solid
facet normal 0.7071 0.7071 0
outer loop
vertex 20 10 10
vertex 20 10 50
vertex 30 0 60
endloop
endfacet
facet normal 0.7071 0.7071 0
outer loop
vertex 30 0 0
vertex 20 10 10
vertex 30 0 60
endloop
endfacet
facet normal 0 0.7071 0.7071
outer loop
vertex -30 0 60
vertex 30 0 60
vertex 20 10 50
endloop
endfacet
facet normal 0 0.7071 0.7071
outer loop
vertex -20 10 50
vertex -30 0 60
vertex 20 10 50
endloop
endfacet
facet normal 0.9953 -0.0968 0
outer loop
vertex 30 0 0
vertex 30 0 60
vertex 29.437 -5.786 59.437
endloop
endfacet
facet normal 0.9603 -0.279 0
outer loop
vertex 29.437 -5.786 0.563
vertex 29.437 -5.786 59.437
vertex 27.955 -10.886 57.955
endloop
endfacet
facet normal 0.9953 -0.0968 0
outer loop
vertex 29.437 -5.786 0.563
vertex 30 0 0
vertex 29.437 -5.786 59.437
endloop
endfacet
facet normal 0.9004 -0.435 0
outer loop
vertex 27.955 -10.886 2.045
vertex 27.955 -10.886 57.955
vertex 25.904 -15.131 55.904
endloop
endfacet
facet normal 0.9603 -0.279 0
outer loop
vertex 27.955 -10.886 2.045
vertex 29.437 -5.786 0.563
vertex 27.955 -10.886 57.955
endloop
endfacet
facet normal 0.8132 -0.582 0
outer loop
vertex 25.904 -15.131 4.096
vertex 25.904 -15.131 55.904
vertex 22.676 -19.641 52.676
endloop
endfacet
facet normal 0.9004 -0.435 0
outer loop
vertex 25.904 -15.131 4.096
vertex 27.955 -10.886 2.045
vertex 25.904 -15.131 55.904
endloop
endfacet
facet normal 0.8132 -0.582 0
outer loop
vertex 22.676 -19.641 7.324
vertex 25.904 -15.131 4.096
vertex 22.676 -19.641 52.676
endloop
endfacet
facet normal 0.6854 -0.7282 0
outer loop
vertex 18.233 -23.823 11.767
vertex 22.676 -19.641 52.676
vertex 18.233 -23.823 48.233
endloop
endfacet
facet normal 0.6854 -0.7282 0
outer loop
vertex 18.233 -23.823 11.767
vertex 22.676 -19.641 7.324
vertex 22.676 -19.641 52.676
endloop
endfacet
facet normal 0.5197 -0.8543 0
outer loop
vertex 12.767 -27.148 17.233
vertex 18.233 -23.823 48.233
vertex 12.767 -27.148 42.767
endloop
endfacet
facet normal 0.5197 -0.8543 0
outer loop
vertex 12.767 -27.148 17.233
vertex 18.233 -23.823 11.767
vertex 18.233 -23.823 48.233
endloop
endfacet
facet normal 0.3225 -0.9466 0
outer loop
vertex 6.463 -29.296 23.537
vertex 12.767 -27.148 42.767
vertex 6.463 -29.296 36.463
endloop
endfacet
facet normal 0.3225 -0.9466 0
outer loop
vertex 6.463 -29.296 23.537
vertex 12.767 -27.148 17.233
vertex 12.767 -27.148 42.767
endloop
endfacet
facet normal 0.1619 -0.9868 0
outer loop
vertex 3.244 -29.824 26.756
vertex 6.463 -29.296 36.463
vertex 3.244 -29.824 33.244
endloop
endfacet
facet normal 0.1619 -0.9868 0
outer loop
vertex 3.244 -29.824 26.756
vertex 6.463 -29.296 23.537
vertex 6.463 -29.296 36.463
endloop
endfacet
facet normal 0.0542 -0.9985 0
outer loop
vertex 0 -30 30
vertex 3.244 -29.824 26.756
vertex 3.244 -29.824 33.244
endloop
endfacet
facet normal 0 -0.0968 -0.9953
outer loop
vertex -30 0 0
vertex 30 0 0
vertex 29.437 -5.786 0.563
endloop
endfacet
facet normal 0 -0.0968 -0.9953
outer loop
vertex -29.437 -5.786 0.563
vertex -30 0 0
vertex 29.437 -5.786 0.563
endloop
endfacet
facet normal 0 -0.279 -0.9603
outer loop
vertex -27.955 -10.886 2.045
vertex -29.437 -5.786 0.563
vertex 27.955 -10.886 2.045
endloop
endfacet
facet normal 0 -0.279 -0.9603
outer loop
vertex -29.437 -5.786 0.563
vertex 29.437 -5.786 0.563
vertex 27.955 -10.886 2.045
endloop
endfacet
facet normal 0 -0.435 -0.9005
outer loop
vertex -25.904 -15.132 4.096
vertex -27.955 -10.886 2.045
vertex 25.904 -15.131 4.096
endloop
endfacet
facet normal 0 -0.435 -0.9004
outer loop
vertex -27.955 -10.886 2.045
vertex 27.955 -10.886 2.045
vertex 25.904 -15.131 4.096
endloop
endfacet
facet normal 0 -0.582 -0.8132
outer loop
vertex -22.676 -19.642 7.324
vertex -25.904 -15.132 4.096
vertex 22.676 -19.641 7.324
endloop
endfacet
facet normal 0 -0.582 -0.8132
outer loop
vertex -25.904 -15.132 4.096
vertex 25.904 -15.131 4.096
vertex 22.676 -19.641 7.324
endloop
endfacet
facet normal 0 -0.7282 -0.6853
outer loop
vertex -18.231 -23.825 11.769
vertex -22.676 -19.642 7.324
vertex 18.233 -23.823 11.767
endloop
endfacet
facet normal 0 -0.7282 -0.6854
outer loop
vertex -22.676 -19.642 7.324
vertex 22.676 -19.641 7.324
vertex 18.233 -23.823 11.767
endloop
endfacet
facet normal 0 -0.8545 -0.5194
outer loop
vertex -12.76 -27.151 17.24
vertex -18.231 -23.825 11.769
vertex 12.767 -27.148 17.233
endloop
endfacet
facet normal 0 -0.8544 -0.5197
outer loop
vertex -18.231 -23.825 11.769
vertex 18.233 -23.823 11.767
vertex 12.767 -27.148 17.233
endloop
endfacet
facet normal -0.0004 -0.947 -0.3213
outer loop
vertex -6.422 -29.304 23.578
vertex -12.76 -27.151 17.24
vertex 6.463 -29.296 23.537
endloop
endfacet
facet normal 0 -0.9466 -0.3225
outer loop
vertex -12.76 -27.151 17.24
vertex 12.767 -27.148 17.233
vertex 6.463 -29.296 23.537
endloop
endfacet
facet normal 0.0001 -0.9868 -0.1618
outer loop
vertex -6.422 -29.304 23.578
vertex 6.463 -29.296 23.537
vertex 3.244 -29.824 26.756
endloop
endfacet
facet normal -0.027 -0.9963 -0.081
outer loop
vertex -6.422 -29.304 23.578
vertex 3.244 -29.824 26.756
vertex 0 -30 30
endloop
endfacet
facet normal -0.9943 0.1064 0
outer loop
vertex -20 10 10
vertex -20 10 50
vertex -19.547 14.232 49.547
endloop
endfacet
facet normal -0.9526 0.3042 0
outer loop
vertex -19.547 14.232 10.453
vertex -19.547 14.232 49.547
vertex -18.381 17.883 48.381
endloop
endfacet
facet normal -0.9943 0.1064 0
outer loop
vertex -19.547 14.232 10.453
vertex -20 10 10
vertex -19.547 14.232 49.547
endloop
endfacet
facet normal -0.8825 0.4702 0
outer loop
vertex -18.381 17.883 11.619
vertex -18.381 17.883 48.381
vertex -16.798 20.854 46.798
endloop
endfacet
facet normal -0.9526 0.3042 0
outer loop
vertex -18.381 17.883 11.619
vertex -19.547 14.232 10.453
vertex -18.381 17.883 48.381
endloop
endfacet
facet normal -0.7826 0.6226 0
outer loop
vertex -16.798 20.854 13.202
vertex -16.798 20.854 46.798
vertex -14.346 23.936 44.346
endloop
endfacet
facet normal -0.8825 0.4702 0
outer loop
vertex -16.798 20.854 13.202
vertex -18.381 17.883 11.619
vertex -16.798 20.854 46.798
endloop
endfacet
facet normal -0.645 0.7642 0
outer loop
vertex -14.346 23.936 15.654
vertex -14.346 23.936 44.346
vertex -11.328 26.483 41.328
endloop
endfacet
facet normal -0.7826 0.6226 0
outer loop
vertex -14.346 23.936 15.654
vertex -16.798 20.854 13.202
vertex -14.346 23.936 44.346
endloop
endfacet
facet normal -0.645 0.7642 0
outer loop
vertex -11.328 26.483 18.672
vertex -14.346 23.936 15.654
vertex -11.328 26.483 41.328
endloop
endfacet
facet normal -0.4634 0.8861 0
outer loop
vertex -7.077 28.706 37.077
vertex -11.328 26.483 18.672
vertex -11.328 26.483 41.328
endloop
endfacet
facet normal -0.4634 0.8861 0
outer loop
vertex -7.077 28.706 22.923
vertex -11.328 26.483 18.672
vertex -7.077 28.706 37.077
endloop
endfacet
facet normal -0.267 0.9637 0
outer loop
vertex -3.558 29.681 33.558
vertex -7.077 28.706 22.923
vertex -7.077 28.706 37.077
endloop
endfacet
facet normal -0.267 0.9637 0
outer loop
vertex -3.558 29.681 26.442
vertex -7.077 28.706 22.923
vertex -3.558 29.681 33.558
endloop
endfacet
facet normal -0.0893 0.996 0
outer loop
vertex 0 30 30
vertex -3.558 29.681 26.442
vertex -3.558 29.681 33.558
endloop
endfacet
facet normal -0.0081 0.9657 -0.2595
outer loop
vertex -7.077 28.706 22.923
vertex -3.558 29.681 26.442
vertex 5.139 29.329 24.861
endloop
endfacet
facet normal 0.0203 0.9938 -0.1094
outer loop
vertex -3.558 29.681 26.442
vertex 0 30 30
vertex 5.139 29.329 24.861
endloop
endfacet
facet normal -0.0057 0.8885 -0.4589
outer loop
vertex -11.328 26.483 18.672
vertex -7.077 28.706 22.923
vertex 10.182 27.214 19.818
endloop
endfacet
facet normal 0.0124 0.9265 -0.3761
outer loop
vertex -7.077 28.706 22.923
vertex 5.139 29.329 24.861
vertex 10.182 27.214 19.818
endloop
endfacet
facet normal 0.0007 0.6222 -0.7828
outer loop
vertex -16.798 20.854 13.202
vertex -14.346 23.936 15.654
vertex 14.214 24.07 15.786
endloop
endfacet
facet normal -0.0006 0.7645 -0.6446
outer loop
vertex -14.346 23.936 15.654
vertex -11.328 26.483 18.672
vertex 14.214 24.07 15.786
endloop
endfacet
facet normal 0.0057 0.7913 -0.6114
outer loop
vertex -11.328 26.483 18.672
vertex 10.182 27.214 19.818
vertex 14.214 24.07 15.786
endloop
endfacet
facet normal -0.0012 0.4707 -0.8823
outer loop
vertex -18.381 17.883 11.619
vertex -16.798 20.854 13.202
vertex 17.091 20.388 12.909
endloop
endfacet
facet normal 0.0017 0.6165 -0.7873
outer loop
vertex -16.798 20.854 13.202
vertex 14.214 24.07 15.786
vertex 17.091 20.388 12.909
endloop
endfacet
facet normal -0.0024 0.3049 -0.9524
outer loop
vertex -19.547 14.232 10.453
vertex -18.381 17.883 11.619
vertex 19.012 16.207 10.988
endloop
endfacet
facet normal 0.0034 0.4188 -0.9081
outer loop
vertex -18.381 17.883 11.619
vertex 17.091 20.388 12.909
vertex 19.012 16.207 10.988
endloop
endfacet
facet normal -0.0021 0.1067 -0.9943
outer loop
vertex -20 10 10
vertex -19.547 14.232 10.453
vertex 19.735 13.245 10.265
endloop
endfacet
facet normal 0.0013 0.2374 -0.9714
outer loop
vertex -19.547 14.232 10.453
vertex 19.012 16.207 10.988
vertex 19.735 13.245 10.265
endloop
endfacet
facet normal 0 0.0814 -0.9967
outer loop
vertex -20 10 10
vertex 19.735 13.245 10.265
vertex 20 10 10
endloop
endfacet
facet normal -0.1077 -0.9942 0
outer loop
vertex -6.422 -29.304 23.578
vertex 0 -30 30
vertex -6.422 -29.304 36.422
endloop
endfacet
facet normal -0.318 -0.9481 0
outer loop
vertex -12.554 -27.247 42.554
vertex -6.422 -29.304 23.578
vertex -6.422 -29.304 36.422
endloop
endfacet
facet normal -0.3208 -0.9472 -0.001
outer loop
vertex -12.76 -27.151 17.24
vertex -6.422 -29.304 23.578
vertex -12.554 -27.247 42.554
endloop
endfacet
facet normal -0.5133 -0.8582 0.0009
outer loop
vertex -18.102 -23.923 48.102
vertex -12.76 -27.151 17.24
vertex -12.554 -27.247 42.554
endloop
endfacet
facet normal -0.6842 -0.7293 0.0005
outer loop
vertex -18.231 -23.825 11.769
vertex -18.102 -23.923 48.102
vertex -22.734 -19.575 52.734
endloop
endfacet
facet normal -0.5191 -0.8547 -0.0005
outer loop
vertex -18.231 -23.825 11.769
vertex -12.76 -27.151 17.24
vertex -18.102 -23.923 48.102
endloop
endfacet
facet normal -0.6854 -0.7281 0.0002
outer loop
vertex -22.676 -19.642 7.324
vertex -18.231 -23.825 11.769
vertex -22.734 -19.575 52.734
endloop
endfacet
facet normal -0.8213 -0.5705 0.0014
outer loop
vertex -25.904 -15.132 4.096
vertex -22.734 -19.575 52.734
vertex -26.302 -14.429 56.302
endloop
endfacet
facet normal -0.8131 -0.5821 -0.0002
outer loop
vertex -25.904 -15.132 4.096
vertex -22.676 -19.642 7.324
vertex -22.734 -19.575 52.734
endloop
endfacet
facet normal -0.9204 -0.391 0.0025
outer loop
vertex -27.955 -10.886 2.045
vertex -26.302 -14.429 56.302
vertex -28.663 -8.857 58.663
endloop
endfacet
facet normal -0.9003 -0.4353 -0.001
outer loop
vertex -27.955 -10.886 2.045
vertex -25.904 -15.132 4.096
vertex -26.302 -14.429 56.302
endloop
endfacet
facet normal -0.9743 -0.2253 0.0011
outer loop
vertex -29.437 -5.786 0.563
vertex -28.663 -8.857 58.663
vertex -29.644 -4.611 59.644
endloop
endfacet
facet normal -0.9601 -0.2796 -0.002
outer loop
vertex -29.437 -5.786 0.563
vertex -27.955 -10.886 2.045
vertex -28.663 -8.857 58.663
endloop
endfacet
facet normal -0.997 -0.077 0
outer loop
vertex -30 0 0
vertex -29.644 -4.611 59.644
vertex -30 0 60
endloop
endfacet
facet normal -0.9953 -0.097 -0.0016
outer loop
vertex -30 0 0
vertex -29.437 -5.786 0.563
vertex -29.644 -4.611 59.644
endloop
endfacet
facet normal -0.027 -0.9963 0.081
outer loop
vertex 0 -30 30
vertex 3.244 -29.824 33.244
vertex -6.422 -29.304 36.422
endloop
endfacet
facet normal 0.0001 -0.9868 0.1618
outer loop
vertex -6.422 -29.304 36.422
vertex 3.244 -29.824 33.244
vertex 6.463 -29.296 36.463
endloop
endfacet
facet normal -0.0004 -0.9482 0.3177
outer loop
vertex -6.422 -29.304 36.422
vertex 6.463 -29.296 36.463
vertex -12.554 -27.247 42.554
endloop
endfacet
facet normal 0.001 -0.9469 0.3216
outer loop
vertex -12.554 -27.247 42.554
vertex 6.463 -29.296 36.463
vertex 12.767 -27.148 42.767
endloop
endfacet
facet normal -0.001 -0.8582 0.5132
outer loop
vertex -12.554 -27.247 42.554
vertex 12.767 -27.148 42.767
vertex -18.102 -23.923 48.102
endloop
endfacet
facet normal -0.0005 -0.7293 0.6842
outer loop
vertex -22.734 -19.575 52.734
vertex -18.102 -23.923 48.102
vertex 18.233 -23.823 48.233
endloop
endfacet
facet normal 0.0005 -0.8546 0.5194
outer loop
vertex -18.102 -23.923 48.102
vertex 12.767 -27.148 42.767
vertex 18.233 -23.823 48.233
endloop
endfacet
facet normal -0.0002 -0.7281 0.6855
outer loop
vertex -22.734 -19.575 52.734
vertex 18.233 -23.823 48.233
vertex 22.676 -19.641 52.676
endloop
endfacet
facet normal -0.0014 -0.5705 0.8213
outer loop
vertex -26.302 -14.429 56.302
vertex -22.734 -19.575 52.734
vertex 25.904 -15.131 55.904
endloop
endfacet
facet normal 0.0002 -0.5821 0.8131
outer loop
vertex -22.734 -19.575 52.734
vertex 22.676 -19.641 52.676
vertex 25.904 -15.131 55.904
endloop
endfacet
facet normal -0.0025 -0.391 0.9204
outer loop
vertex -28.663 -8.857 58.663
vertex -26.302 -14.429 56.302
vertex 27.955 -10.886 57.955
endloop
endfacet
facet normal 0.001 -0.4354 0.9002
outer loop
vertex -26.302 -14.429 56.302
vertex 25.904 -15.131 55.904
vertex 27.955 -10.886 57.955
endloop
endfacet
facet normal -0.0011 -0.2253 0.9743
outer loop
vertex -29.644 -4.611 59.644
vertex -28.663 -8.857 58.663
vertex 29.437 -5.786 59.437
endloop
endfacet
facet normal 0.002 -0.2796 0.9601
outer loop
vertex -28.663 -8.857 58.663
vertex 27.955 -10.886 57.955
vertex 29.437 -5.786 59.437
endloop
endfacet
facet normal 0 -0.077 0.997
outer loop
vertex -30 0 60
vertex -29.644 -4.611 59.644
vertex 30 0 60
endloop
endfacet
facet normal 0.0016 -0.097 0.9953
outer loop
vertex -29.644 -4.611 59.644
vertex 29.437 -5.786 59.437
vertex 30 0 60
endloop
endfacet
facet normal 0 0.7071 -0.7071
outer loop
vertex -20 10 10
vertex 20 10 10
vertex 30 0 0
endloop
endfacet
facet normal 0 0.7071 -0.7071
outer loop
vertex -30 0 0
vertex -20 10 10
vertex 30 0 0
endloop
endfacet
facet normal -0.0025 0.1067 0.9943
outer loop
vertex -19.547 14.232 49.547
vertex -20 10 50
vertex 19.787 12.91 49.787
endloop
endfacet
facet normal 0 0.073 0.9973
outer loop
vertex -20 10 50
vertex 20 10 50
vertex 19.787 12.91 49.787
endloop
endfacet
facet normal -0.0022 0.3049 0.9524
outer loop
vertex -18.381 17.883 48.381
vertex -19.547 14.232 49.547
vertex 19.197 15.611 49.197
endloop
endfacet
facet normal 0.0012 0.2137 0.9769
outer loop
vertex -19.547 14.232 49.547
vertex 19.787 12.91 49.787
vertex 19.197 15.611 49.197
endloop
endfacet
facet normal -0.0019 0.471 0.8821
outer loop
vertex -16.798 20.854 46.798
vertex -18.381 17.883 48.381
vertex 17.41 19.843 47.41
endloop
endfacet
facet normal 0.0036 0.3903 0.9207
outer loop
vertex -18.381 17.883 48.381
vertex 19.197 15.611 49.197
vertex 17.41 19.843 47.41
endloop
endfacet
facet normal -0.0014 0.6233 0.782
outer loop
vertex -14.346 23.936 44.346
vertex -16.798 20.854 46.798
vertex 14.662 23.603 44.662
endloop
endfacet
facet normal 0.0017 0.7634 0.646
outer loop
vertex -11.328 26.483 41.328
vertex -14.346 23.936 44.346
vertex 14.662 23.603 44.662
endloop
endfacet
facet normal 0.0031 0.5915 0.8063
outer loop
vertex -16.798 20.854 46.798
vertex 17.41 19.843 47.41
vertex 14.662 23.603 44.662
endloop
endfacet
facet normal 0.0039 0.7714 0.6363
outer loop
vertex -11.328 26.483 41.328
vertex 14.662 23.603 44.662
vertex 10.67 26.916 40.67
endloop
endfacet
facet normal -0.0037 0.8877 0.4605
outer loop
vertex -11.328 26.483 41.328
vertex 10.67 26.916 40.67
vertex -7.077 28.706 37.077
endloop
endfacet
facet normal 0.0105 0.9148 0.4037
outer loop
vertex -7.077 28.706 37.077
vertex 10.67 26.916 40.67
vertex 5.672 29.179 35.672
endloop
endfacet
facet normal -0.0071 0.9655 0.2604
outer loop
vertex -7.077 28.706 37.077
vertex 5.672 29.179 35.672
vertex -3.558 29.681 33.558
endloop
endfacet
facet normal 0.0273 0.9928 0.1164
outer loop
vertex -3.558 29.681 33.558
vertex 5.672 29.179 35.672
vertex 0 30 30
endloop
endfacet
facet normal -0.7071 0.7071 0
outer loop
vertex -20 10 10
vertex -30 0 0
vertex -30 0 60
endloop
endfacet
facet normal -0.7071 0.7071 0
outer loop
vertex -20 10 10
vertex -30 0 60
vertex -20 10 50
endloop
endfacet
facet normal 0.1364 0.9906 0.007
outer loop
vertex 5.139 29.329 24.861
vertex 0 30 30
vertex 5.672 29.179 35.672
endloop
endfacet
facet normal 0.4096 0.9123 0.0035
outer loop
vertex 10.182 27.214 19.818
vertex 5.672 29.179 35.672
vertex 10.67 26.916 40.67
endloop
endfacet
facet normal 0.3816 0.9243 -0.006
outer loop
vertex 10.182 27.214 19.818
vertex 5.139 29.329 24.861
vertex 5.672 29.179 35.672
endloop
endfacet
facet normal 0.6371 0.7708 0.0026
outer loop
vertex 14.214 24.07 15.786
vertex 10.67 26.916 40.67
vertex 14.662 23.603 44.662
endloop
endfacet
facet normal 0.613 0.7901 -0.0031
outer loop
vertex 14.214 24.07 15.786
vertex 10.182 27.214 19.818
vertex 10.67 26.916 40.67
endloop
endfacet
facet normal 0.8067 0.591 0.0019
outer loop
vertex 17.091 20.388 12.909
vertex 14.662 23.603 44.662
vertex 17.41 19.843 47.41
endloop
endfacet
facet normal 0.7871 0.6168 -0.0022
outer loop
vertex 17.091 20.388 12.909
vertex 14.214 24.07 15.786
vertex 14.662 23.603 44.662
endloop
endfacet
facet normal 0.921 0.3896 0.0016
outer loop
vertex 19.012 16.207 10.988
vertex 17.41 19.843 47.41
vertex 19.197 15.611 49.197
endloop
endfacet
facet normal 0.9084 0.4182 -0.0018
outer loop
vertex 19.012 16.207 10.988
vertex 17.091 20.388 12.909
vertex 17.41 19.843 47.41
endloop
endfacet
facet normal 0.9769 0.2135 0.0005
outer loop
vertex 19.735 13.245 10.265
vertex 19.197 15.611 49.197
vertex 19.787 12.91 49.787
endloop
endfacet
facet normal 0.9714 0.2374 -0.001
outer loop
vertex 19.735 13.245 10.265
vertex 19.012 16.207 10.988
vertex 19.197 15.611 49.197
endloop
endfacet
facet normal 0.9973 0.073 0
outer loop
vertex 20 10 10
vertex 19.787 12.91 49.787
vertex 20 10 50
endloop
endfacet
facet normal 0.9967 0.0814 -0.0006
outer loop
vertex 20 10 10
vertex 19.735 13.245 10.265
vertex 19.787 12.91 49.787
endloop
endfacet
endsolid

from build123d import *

# Parameters (mm, degrees)
BOSS_EXTRUDE1_DEPTH     = 60
CUT_EXTRUDE1_DEPTH      = 60
CUT_EXTRUDE1_DEPTH_BACK = 60


with BuildPart() as part:
    # Sketch1 → Boss-Extrude1 (new body)
    with BuildSketch(Plane.XY):
        with BuildLine():
            Line((-30, 0), (-20.000000000000004, 10))
            ThreePointArc((-20.000000000000004, 10), (1.22e-15, 29.999999999999996), (19.999999999999996, 10))
            Line((19.999999999999996, 10), (30, 0))
            ThreePointArc((30, 0), (1.84e-15, -30), (-30, 0))
        make_face()
    extrude(amount=BOSS_EXTRUDE1_DEPTH)

    # Sketch2 → Cut-Extrude1 (cut, two sides: drawn at the far end of the back side and taken through both)
    with BuildSketch(Plane(origin=(0, 0, 0), x_dir=(0, 0, -1), z_dir=(1, 0, 0)).offset(-CUT_EXTRUDE1_DEPTH_BACK)):
        with BuildLine():
            Line((-10.000000000000002, 10.000000000000004), (0, 0))
            Line((0, 0), (0, 30))
            Line((0, 30), (-30.000000000000007, 30))
            ThreePointArc((-30.000000000000007, 29.99999999999999), (-15.85786437626906, 24.142135623730947), (-10.000000000000004, 10.000000000000004))
        make_face()
        with BuildLine():
            Line((0, -30), (0, -3.55e-15))
            ThreePointArc((0, -5.45e-15), (-8.786796564403577, -21.213203435596427), (-30.000000000000018, -30))
            Line((-30.000000000000018, -30), (0, -30))
        make_face()
        with BuildLine():
            Line((-60, -30), (-30.000000000000018, -30))
            ThreePointArc((-30.000000000000018, -30), (-51.21320343559643, -21.21320343559642), (-60, 0))
            Line((-60, 0), (-60, -30))
        make_face()
        with BuildLine():
            ThreePointArc((-50, 10.000000000000002), (-44.142135623730944, 24.142135623730944), (-30.000000000000007, 29.99999999999999))
            Line((-30.000000000000007, 30), (-60, 30))
            Line((-60, 30), (-60, 0))
            Line((-60, 0), (-49.99999999999999, 10.000000000000002))
        make_face()
    extrude(amount=CUT_EXTRUDE1_DEPTH + CUT_EXTRUDE1_DEPTH_BACK, mode=Mode.SUBTRACT)


solid = part.part
